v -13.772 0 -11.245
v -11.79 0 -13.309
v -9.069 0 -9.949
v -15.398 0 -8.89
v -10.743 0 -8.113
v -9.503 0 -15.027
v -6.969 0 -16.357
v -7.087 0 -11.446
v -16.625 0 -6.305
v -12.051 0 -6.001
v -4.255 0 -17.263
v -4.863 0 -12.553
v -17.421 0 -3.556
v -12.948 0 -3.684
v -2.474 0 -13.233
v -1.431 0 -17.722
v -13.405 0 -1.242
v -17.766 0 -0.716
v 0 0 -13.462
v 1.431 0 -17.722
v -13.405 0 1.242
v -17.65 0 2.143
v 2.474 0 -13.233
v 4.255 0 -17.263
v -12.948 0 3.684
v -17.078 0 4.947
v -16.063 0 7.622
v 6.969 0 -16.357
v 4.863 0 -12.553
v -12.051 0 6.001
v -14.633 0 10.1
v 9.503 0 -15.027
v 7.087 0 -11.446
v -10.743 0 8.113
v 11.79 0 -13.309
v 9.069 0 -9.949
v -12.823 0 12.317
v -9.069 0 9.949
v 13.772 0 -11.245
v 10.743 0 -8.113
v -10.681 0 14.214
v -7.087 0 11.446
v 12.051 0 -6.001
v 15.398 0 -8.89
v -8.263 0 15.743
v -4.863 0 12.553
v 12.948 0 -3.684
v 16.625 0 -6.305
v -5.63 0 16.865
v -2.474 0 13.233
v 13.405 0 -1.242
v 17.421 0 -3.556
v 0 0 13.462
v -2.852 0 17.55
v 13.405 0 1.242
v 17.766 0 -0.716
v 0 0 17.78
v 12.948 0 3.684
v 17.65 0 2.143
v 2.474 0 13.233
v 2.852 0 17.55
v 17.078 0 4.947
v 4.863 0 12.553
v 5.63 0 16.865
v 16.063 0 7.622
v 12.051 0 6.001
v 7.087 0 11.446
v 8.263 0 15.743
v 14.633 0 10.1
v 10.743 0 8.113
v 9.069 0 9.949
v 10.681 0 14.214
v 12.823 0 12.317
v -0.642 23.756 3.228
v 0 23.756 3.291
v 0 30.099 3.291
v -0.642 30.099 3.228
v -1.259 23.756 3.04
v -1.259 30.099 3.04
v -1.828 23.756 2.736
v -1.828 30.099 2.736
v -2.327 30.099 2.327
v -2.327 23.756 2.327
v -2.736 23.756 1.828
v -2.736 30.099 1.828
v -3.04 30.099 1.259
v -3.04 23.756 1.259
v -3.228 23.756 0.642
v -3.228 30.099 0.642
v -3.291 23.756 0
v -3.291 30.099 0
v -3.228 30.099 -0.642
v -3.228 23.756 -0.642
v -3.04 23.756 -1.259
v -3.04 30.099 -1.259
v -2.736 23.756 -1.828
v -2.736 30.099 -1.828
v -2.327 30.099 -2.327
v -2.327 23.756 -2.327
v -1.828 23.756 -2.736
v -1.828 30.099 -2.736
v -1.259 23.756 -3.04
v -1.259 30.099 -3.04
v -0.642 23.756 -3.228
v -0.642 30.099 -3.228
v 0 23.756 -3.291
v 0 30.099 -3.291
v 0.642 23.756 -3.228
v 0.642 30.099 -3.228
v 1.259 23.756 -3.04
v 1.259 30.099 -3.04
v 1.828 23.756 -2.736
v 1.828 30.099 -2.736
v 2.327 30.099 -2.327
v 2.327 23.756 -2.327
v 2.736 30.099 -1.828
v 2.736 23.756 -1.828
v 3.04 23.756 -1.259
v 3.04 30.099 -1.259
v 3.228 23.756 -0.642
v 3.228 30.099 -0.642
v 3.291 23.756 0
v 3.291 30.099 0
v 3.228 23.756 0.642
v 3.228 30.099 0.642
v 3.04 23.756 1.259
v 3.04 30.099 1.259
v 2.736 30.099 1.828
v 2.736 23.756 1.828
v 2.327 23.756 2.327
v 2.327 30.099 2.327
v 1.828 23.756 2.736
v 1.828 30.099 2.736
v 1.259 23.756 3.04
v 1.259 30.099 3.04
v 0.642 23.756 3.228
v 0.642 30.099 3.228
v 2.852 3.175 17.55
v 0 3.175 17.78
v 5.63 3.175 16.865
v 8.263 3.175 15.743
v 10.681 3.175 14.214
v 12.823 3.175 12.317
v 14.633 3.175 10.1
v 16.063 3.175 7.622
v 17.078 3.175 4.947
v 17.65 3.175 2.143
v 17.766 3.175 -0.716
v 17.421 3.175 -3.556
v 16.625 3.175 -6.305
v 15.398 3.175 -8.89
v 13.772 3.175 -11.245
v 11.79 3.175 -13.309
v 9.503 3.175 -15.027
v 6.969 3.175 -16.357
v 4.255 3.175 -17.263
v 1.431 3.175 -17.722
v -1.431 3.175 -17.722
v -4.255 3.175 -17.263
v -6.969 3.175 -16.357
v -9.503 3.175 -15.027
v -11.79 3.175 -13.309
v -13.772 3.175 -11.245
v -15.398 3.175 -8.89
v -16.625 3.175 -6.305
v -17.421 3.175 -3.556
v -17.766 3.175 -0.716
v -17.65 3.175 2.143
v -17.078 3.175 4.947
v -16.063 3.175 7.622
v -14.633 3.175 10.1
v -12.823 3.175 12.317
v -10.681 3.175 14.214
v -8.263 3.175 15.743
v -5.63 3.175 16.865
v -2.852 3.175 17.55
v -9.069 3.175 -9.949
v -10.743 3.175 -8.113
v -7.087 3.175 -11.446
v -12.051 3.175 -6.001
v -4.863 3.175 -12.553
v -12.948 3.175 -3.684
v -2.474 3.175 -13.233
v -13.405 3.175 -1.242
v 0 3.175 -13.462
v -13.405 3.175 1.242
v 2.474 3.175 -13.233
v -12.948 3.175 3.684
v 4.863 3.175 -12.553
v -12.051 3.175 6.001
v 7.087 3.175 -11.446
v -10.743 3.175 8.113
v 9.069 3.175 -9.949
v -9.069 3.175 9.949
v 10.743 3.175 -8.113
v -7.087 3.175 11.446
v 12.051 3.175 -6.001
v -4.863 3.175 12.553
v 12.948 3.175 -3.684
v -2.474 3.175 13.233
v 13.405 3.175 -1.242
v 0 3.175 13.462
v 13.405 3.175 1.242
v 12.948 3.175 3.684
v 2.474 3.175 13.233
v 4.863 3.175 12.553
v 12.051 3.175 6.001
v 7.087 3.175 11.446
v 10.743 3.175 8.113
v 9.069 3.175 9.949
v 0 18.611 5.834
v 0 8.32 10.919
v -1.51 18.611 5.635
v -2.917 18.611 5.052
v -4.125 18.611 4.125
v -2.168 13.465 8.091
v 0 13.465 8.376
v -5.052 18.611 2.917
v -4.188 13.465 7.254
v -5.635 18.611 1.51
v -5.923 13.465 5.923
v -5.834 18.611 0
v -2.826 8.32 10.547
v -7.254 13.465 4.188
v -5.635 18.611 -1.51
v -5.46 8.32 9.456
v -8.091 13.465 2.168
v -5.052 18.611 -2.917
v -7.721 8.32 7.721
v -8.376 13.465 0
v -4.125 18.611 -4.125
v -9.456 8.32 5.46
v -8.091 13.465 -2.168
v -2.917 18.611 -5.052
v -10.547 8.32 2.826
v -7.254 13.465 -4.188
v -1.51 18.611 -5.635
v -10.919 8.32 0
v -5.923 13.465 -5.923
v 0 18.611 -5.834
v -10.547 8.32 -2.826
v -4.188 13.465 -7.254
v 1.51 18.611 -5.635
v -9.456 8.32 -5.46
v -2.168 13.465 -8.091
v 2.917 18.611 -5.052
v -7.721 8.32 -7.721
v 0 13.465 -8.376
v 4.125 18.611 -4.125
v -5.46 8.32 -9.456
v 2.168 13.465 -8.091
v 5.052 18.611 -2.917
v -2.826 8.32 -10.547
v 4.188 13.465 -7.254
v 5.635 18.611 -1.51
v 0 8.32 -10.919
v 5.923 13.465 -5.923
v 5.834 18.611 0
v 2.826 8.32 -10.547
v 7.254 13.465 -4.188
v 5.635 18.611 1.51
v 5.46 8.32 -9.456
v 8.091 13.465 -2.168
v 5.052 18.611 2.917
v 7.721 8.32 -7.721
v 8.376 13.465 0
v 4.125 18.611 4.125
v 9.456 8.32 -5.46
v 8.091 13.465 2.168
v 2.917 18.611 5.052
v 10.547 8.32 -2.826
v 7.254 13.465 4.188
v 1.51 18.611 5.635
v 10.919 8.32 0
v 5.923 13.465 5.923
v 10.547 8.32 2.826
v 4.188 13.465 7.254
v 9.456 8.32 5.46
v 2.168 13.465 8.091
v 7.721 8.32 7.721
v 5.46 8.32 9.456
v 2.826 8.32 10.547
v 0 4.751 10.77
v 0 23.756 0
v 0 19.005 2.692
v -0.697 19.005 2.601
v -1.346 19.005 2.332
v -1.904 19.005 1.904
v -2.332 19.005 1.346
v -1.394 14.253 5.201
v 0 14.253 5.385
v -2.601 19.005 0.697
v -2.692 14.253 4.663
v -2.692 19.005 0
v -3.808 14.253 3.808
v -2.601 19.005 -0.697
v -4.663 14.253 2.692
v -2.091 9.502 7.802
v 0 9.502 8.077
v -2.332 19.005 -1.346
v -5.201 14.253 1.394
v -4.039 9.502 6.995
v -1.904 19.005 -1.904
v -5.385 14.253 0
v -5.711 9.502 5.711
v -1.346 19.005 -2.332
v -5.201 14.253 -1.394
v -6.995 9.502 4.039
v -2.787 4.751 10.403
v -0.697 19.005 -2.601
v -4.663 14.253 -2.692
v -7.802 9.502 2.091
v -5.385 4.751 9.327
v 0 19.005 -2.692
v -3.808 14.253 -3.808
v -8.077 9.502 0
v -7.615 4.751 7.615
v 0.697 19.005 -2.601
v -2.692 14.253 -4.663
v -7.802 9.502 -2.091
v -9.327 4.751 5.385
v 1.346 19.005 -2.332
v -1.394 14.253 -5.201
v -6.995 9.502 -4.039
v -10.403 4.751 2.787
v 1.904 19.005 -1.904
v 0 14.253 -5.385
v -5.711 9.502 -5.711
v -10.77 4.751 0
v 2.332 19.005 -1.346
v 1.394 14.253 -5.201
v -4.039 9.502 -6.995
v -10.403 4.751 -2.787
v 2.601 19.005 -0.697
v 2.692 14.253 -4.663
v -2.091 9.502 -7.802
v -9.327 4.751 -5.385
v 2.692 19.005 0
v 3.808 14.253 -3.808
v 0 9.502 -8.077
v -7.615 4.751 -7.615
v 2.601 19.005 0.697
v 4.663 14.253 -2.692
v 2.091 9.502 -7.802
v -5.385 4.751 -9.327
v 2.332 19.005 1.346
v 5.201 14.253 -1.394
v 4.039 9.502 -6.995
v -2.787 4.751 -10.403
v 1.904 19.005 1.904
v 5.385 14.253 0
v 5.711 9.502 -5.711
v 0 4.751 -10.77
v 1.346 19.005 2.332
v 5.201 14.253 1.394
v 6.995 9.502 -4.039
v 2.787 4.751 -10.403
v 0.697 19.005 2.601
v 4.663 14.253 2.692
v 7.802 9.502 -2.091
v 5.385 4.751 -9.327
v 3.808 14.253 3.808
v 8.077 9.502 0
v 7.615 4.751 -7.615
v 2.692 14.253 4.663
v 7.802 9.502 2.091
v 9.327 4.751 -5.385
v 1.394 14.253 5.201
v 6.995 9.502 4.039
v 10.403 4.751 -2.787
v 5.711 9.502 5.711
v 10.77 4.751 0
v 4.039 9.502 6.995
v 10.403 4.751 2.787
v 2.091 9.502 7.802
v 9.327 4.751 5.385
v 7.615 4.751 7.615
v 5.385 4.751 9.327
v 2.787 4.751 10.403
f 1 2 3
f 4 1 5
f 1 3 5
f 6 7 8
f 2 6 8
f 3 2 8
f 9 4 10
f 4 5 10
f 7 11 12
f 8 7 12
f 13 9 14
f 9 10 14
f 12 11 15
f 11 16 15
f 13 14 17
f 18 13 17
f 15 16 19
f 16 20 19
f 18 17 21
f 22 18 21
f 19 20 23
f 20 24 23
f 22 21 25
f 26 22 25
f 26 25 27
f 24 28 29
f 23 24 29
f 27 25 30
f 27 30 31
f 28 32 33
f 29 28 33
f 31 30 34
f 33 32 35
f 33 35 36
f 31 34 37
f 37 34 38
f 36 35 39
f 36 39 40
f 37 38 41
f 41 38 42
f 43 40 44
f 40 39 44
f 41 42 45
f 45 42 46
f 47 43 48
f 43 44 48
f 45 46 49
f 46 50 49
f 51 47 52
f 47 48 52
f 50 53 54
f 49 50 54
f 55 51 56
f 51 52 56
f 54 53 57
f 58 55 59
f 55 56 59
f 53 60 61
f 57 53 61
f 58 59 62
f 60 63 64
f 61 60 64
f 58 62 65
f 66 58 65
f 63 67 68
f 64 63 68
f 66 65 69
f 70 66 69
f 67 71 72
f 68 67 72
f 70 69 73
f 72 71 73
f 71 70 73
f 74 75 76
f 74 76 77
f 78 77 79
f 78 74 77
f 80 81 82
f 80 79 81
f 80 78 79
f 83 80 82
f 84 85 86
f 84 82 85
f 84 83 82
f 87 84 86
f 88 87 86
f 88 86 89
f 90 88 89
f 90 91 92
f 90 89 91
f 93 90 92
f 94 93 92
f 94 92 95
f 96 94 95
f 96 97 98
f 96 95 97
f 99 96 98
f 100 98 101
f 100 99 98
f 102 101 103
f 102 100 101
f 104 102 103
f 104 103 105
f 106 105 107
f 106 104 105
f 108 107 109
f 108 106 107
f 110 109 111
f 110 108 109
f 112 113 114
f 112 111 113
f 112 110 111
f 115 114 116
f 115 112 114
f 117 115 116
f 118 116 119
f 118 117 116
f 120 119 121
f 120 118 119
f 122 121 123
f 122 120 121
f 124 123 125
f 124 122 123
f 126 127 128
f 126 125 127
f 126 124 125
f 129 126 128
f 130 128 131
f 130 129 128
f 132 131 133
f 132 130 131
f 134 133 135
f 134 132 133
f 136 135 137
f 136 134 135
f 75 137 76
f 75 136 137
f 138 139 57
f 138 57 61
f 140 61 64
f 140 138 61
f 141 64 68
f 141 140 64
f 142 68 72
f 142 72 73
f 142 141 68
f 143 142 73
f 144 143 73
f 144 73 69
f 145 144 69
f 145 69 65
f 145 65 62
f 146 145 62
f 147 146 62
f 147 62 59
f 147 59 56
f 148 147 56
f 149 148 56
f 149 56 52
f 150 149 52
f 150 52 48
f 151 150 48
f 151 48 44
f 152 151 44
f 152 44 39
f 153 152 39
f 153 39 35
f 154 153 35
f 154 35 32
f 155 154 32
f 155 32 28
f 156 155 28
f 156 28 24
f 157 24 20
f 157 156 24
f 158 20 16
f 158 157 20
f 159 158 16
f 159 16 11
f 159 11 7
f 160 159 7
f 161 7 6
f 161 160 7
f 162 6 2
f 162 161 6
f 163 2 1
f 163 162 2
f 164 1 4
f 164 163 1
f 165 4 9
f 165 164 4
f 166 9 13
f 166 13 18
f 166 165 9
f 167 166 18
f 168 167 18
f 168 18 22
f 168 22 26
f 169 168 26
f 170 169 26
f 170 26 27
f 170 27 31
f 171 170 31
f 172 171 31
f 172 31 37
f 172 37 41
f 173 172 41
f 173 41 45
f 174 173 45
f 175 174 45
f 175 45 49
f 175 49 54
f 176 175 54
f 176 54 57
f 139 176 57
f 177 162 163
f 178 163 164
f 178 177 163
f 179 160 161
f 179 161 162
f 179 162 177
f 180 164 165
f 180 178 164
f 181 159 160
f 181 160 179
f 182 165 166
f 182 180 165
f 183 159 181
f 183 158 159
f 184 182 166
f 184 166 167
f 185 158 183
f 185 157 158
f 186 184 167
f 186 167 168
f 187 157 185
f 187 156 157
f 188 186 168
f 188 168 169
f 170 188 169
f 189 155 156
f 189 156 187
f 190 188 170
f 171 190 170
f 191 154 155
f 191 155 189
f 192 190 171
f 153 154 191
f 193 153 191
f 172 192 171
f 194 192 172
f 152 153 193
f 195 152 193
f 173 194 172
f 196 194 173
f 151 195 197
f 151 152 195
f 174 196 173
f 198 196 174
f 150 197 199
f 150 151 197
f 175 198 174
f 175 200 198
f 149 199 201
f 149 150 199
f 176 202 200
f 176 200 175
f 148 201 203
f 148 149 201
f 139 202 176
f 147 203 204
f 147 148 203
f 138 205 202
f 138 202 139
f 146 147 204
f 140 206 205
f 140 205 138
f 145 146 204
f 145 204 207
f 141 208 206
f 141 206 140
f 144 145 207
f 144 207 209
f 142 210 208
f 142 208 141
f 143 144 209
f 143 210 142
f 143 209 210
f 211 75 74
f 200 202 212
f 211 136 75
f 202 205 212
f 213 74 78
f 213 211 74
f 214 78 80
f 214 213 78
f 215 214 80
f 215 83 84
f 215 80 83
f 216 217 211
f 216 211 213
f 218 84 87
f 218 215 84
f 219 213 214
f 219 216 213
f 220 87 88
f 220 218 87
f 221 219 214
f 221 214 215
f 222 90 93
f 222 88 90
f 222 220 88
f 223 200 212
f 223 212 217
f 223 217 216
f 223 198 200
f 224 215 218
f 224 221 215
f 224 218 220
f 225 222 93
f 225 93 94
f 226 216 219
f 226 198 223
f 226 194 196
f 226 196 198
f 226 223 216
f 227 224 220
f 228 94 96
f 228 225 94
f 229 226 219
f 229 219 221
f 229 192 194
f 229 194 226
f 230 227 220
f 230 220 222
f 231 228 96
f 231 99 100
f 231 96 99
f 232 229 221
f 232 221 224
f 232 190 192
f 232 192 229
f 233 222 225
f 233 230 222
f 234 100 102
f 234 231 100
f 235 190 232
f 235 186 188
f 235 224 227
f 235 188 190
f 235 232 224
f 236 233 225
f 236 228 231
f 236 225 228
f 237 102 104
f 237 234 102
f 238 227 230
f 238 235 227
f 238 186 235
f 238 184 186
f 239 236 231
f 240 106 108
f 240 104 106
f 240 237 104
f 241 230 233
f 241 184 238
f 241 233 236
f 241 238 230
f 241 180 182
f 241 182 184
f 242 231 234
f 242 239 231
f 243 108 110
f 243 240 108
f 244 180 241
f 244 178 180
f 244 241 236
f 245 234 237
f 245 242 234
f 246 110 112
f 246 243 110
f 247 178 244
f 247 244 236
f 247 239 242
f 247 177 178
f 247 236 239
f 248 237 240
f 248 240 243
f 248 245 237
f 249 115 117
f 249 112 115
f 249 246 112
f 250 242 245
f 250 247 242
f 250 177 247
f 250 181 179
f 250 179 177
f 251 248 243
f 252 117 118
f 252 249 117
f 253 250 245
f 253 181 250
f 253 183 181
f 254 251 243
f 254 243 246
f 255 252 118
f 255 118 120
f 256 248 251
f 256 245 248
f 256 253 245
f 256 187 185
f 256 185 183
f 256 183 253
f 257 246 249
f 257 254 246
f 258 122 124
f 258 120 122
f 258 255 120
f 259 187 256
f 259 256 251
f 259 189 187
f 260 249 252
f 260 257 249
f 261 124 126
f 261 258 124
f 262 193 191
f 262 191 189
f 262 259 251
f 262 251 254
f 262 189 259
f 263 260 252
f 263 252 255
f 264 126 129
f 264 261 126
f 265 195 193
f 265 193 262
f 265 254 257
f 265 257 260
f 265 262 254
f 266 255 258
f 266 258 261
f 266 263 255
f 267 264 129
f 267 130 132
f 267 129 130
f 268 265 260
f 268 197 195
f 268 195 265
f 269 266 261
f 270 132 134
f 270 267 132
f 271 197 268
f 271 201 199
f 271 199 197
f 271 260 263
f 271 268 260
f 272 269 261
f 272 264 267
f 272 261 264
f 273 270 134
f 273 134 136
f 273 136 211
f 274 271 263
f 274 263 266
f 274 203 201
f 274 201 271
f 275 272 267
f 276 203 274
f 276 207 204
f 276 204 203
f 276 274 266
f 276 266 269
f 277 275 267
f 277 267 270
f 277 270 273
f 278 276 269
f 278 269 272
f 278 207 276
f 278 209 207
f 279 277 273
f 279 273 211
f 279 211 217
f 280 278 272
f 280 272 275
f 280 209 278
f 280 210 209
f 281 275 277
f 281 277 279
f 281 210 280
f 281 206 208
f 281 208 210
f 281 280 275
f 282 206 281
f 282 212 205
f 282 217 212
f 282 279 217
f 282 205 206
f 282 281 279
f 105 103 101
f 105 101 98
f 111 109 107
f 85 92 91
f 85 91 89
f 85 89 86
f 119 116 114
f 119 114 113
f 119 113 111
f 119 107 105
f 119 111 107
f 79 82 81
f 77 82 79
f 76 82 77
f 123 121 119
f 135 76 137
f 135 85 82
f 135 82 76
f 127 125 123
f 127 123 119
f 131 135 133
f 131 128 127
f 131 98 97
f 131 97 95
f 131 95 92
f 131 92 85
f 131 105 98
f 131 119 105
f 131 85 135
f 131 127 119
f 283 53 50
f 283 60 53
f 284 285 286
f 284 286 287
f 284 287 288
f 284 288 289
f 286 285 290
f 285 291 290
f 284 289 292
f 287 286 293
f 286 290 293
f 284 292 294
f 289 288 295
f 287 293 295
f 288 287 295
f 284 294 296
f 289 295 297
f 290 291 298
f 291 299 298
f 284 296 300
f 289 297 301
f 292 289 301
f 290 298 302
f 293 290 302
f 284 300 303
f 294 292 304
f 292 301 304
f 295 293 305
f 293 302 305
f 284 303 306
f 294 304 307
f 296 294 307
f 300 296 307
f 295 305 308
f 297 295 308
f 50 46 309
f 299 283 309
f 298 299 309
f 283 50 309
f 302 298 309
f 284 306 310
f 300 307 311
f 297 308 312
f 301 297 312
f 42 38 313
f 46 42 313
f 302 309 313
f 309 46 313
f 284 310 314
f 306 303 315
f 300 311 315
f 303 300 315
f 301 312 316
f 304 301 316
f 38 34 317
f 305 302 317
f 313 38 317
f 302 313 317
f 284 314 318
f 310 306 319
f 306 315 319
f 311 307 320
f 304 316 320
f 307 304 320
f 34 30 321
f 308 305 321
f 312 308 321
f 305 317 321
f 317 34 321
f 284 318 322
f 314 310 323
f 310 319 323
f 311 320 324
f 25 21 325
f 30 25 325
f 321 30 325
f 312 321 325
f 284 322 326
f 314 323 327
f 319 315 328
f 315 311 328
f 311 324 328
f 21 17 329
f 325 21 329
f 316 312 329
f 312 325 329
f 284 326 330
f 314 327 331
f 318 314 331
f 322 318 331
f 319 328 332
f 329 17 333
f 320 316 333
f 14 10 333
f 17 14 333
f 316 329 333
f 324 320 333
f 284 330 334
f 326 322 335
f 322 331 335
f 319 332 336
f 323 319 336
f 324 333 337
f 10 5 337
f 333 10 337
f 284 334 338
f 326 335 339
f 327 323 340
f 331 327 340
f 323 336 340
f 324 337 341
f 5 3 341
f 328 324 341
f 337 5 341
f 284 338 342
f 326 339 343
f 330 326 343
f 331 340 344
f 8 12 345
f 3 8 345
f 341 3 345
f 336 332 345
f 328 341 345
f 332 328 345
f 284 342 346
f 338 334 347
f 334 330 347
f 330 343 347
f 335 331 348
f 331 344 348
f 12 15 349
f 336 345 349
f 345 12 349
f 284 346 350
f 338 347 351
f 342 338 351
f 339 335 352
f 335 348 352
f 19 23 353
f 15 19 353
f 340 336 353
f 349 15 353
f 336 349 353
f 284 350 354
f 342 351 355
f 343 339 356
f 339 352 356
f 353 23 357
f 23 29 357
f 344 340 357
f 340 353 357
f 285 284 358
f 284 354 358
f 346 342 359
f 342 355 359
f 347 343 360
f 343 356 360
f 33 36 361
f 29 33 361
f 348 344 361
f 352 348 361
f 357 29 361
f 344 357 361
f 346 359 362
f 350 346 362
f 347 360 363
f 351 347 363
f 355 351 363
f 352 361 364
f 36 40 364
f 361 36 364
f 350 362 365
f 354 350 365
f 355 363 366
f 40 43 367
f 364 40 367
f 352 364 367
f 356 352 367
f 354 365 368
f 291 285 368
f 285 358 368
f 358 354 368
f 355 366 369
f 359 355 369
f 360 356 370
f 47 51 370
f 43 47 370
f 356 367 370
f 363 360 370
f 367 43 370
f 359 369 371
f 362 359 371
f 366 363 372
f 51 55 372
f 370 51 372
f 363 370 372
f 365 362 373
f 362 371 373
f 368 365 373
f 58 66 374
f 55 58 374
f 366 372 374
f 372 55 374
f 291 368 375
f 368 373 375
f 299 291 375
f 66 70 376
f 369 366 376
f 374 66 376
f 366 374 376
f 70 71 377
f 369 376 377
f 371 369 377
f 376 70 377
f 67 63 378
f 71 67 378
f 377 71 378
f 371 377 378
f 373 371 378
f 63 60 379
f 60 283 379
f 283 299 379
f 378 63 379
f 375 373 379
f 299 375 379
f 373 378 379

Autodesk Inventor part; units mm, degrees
ref_plane "YZ Plane" through (0, 0, 0) normal (1, 0, 0) x (0, 1, 0)
ref_plane "XZ Plane" through (0, 0, 0) normal (0, 1, 0) x (-1, 0, 0)
ref_plane "XY Plane" through (0, 0, 0) normal (0, 0, 1) x (1, 0, 0)
sketch "Sketch1" plane through (0, 0, 0) normal (1, 0, 0) x (0, 1, 0)
  line L0 (0, 17.78) -> (3.175, 17.78)
  line L1 (3.175, 17.78) -> (3.175, 13.462)
  line L2 (0, 0) -> (30.099, 0)
  line L3 (30.099, 0) -> (30.099, 3.2908)
  line L4 (30.099, 3.2908) -> (23.7557, 3.2908)
  line L5 (23.7557, 3.2908) -> (3.175, 13.462)
  line L6 (23.7557, 0) -> (0, 13.462)
  line L7 (0, 17.78) -> (0, 13.462)
  dimension "d0" = 17.78
  dimension "d1" = 3.175
  dimension "d2" = 4.318
  dimension "d3" = 30.099
revolve "Revolution1" add sketch "Sketch1" angle 360 about axis through (0, 0, 0) along (0, 1, 0)
properties part number "nozzletopcone"
